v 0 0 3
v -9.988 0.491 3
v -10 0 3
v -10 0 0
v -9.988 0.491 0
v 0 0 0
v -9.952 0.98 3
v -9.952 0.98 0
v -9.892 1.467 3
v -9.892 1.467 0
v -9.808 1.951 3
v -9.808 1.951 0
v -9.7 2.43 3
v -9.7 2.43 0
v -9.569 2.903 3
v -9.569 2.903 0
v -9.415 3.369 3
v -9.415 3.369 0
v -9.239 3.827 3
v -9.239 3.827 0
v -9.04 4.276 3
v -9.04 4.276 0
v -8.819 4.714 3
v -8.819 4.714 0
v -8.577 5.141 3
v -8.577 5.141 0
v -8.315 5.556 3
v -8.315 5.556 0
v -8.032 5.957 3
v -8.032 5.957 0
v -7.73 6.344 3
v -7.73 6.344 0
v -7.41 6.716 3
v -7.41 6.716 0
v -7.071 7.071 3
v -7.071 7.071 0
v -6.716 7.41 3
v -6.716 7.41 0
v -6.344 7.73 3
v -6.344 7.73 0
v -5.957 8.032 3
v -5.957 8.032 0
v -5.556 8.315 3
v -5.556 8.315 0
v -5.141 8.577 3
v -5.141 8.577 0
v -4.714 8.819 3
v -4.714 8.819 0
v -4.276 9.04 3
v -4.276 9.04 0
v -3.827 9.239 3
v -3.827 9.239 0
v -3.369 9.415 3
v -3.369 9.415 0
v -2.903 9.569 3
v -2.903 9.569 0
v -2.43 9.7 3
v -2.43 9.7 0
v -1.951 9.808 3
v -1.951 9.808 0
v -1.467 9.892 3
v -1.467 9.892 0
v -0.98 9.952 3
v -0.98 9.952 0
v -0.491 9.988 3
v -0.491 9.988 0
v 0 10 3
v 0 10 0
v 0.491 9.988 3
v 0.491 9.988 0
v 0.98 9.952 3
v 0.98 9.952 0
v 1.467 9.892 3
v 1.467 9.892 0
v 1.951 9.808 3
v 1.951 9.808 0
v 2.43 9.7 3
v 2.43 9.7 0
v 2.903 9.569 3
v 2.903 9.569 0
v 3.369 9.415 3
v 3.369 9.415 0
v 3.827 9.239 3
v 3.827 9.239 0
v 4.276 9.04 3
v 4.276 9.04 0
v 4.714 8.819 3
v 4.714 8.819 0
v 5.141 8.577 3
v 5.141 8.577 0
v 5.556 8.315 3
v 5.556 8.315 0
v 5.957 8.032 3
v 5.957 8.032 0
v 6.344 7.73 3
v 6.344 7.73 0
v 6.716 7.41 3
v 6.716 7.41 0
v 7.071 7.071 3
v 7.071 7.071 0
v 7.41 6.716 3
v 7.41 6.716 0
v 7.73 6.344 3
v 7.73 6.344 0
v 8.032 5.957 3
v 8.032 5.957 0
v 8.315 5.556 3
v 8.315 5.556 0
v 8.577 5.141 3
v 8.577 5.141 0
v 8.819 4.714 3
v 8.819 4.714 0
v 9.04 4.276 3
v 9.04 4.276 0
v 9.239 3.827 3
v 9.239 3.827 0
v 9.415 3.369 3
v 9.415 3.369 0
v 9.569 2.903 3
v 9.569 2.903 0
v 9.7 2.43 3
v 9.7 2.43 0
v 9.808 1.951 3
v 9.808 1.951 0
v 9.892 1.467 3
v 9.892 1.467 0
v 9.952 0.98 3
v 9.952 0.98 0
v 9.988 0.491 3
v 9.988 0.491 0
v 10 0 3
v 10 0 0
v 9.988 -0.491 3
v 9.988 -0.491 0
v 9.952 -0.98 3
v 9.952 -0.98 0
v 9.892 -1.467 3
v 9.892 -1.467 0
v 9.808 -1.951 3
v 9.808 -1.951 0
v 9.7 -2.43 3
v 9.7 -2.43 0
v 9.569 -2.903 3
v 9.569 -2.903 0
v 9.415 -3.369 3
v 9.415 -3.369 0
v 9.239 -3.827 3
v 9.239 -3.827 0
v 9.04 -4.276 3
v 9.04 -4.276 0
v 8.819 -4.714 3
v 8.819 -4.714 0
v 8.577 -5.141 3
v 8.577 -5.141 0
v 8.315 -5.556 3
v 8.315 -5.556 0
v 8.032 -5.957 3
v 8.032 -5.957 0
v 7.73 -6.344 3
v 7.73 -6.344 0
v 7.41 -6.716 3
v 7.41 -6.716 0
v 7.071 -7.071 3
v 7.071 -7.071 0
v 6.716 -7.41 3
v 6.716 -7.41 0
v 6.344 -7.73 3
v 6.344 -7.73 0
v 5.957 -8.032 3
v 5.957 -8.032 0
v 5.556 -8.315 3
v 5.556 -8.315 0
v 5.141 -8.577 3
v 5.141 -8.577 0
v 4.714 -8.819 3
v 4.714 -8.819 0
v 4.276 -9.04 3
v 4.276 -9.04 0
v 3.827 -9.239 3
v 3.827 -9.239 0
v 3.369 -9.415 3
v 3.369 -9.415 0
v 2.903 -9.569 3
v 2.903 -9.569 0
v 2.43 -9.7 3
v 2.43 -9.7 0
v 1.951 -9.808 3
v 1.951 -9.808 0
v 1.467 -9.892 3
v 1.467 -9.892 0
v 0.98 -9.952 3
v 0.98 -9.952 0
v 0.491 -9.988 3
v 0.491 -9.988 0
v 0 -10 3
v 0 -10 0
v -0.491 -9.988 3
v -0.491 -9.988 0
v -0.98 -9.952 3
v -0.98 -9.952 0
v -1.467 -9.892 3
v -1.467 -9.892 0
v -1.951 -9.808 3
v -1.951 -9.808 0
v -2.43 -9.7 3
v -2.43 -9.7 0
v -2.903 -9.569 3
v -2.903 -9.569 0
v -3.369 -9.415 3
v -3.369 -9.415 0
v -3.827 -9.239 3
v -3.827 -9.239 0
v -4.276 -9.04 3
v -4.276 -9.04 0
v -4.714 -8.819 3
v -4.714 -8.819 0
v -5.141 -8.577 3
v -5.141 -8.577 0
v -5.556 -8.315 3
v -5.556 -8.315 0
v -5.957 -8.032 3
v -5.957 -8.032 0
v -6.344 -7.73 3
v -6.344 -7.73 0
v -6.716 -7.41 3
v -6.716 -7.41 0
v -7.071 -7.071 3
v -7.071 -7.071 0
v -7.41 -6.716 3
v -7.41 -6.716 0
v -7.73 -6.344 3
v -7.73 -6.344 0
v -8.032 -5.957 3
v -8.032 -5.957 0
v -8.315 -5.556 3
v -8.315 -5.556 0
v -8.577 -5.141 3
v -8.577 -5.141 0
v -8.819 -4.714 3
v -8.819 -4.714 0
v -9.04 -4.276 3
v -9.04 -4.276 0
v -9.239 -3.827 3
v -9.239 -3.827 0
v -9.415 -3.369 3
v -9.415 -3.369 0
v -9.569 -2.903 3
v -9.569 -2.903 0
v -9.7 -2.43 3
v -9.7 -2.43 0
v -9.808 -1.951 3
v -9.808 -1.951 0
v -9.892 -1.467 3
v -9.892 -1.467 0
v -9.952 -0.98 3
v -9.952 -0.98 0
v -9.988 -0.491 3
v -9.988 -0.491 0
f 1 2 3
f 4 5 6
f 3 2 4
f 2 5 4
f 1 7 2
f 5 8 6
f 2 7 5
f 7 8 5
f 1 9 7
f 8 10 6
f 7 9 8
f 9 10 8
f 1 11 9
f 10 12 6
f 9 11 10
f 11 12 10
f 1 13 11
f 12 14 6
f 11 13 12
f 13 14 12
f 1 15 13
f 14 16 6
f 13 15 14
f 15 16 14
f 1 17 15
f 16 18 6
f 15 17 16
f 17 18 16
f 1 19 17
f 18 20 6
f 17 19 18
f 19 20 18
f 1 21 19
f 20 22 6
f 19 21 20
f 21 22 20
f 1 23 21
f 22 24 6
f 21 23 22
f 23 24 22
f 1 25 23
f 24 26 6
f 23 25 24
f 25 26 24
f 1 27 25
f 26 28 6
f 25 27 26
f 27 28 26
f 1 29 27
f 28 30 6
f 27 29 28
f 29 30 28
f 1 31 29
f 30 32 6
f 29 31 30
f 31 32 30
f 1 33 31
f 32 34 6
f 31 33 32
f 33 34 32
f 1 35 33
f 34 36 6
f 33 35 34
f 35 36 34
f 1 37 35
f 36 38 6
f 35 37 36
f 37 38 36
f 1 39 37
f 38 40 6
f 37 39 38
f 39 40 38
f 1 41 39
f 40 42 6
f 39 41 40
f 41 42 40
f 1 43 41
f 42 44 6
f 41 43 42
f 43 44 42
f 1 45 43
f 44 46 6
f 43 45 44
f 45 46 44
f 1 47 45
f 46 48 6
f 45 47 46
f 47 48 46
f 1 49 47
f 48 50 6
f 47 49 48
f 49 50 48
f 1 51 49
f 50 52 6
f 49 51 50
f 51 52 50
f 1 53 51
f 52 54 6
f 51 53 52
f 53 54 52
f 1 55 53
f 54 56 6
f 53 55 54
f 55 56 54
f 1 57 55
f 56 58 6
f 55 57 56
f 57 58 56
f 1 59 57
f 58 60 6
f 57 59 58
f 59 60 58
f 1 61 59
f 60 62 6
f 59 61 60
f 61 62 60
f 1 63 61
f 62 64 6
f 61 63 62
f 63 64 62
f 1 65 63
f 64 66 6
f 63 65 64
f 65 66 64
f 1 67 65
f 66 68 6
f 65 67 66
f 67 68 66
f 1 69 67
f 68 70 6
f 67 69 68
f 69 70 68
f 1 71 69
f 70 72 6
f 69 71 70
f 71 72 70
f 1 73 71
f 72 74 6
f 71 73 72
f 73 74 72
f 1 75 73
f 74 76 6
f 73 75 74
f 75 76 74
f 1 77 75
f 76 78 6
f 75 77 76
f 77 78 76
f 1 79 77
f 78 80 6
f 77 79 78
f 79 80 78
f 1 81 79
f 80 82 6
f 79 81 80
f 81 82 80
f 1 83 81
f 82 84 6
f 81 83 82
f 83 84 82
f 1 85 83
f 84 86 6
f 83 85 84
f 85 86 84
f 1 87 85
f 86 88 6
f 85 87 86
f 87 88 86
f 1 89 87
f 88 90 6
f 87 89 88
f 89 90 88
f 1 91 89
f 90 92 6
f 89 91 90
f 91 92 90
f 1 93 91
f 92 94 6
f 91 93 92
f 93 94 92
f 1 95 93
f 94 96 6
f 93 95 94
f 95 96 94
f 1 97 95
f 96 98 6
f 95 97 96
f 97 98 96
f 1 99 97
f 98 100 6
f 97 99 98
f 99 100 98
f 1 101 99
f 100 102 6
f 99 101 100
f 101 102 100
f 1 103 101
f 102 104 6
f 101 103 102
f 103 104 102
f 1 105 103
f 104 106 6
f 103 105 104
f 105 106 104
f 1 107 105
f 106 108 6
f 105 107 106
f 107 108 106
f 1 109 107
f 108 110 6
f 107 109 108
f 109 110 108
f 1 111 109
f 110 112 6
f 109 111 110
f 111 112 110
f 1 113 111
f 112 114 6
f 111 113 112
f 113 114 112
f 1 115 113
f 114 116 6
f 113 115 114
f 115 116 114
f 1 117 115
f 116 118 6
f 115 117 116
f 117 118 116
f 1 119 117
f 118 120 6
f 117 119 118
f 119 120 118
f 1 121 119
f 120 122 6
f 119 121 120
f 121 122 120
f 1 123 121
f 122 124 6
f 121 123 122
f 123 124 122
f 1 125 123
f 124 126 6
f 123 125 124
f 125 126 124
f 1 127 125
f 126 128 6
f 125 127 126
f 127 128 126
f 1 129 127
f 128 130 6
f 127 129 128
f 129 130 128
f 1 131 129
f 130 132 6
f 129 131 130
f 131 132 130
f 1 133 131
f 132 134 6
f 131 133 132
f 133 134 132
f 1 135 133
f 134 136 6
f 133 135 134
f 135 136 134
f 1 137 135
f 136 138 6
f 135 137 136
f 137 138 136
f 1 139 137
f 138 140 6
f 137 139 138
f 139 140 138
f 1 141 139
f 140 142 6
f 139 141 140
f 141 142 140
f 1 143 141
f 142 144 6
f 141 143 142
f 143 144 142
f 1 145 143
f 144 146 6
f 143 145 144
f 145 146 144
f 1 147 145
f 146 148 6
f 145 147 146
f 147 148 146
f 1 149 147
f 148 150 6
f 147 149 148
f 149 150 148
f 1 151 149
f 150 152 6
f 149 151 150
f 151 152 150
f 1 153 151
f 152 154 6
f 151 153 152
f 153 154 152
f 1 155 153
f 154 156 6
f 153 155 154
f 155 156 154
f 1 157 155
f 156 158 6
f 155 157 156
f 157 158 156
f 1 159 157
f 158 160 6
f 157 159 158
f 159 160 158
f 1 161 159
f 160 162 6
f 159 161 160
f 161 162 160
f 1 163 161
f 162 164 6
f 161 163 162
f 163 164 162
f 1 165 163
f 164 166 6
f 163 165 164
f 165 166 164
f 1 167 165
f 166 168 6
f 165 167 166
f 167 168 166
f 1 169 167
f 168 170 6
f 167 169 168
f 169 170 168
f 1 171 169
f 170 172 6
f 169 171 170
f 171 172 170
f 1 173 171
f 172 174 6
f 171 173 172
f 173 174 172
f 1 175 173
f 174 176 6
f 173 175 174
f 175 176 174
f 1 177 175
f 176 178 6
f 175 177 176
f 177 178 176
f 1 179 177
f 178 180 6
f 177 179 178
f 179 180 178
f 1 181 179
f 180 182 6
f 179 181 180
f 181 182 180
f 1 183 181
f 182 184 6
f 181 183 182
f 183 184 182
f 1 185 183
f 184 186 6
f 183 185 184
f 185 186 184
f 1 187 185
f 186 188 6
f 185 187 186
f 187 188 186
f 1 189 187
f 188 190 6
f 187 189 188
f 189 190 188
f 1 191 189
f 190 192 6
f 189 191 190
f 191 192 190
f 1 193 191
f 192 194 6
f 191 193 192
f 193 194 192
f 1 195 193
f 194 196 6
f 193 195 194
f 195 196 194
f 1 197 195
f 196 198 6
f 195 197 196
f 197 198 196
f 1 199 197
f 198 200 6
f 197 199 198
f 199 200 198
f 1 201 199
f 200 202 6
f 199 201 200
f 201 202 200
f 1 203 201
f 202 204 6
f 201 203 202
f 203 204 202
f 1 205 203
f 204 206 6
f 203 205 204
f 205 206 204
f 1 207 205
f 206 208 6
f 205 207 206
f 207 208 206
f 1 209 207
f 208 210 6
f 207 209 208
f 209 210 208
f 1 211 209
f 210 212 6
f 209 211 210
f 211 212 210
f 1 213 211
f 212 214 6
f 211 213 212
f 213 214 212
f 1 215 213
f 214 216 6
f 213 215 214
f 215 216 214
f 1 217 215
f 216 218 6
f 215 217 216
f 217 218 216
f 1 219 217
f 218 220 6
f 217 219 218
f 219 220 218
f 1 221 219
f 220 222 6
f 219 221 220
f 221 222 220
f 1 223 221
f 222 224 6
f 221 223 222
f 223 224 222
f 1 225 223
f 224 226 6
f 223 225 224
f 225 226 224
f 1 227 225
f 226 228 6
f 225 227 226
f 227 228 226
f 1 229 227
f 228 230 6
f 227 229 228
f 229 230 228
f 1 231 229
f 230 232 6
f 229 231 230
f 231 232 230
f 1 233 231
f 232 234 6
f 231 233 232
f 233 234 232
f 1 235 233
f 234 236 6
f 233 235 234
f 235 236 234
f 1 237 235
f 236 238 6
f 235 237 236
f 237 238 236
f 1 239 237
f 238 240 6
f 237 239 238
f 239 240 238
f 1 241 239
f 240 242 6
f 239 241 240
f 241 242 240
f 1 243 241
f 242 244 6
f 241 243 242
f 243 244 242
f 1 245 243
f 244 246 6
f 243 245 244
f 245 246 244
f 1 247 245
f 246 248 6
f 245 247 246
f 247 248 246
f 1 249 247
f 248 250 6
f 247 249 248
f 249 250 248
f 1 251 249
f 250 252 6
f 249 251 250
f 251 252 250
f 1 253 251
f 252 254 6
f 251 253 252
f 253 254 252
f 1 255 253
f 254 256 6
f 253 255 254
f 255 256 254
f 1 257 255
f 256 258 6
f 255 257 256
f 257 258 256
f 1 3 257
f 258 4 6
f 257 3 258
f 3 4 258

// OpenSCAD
// Auto-generated from tests/data/feature_fixtures_manifest.json
// fixture: revolve_fat_disk
// fixture_type: revolve
// description: Wide low-aspect rectangle profile revolved around Z; Phase 2 cylinder primitive upgrade.
$fn = 96;

profile = [
    [0.000000, 0.000000],
    [10.000000, 0.000000],
    [10.000000, 3.000000],
    [0.000000, 3.000000]
];

rotate_extrude($fn=128) polygon(points=profile);
